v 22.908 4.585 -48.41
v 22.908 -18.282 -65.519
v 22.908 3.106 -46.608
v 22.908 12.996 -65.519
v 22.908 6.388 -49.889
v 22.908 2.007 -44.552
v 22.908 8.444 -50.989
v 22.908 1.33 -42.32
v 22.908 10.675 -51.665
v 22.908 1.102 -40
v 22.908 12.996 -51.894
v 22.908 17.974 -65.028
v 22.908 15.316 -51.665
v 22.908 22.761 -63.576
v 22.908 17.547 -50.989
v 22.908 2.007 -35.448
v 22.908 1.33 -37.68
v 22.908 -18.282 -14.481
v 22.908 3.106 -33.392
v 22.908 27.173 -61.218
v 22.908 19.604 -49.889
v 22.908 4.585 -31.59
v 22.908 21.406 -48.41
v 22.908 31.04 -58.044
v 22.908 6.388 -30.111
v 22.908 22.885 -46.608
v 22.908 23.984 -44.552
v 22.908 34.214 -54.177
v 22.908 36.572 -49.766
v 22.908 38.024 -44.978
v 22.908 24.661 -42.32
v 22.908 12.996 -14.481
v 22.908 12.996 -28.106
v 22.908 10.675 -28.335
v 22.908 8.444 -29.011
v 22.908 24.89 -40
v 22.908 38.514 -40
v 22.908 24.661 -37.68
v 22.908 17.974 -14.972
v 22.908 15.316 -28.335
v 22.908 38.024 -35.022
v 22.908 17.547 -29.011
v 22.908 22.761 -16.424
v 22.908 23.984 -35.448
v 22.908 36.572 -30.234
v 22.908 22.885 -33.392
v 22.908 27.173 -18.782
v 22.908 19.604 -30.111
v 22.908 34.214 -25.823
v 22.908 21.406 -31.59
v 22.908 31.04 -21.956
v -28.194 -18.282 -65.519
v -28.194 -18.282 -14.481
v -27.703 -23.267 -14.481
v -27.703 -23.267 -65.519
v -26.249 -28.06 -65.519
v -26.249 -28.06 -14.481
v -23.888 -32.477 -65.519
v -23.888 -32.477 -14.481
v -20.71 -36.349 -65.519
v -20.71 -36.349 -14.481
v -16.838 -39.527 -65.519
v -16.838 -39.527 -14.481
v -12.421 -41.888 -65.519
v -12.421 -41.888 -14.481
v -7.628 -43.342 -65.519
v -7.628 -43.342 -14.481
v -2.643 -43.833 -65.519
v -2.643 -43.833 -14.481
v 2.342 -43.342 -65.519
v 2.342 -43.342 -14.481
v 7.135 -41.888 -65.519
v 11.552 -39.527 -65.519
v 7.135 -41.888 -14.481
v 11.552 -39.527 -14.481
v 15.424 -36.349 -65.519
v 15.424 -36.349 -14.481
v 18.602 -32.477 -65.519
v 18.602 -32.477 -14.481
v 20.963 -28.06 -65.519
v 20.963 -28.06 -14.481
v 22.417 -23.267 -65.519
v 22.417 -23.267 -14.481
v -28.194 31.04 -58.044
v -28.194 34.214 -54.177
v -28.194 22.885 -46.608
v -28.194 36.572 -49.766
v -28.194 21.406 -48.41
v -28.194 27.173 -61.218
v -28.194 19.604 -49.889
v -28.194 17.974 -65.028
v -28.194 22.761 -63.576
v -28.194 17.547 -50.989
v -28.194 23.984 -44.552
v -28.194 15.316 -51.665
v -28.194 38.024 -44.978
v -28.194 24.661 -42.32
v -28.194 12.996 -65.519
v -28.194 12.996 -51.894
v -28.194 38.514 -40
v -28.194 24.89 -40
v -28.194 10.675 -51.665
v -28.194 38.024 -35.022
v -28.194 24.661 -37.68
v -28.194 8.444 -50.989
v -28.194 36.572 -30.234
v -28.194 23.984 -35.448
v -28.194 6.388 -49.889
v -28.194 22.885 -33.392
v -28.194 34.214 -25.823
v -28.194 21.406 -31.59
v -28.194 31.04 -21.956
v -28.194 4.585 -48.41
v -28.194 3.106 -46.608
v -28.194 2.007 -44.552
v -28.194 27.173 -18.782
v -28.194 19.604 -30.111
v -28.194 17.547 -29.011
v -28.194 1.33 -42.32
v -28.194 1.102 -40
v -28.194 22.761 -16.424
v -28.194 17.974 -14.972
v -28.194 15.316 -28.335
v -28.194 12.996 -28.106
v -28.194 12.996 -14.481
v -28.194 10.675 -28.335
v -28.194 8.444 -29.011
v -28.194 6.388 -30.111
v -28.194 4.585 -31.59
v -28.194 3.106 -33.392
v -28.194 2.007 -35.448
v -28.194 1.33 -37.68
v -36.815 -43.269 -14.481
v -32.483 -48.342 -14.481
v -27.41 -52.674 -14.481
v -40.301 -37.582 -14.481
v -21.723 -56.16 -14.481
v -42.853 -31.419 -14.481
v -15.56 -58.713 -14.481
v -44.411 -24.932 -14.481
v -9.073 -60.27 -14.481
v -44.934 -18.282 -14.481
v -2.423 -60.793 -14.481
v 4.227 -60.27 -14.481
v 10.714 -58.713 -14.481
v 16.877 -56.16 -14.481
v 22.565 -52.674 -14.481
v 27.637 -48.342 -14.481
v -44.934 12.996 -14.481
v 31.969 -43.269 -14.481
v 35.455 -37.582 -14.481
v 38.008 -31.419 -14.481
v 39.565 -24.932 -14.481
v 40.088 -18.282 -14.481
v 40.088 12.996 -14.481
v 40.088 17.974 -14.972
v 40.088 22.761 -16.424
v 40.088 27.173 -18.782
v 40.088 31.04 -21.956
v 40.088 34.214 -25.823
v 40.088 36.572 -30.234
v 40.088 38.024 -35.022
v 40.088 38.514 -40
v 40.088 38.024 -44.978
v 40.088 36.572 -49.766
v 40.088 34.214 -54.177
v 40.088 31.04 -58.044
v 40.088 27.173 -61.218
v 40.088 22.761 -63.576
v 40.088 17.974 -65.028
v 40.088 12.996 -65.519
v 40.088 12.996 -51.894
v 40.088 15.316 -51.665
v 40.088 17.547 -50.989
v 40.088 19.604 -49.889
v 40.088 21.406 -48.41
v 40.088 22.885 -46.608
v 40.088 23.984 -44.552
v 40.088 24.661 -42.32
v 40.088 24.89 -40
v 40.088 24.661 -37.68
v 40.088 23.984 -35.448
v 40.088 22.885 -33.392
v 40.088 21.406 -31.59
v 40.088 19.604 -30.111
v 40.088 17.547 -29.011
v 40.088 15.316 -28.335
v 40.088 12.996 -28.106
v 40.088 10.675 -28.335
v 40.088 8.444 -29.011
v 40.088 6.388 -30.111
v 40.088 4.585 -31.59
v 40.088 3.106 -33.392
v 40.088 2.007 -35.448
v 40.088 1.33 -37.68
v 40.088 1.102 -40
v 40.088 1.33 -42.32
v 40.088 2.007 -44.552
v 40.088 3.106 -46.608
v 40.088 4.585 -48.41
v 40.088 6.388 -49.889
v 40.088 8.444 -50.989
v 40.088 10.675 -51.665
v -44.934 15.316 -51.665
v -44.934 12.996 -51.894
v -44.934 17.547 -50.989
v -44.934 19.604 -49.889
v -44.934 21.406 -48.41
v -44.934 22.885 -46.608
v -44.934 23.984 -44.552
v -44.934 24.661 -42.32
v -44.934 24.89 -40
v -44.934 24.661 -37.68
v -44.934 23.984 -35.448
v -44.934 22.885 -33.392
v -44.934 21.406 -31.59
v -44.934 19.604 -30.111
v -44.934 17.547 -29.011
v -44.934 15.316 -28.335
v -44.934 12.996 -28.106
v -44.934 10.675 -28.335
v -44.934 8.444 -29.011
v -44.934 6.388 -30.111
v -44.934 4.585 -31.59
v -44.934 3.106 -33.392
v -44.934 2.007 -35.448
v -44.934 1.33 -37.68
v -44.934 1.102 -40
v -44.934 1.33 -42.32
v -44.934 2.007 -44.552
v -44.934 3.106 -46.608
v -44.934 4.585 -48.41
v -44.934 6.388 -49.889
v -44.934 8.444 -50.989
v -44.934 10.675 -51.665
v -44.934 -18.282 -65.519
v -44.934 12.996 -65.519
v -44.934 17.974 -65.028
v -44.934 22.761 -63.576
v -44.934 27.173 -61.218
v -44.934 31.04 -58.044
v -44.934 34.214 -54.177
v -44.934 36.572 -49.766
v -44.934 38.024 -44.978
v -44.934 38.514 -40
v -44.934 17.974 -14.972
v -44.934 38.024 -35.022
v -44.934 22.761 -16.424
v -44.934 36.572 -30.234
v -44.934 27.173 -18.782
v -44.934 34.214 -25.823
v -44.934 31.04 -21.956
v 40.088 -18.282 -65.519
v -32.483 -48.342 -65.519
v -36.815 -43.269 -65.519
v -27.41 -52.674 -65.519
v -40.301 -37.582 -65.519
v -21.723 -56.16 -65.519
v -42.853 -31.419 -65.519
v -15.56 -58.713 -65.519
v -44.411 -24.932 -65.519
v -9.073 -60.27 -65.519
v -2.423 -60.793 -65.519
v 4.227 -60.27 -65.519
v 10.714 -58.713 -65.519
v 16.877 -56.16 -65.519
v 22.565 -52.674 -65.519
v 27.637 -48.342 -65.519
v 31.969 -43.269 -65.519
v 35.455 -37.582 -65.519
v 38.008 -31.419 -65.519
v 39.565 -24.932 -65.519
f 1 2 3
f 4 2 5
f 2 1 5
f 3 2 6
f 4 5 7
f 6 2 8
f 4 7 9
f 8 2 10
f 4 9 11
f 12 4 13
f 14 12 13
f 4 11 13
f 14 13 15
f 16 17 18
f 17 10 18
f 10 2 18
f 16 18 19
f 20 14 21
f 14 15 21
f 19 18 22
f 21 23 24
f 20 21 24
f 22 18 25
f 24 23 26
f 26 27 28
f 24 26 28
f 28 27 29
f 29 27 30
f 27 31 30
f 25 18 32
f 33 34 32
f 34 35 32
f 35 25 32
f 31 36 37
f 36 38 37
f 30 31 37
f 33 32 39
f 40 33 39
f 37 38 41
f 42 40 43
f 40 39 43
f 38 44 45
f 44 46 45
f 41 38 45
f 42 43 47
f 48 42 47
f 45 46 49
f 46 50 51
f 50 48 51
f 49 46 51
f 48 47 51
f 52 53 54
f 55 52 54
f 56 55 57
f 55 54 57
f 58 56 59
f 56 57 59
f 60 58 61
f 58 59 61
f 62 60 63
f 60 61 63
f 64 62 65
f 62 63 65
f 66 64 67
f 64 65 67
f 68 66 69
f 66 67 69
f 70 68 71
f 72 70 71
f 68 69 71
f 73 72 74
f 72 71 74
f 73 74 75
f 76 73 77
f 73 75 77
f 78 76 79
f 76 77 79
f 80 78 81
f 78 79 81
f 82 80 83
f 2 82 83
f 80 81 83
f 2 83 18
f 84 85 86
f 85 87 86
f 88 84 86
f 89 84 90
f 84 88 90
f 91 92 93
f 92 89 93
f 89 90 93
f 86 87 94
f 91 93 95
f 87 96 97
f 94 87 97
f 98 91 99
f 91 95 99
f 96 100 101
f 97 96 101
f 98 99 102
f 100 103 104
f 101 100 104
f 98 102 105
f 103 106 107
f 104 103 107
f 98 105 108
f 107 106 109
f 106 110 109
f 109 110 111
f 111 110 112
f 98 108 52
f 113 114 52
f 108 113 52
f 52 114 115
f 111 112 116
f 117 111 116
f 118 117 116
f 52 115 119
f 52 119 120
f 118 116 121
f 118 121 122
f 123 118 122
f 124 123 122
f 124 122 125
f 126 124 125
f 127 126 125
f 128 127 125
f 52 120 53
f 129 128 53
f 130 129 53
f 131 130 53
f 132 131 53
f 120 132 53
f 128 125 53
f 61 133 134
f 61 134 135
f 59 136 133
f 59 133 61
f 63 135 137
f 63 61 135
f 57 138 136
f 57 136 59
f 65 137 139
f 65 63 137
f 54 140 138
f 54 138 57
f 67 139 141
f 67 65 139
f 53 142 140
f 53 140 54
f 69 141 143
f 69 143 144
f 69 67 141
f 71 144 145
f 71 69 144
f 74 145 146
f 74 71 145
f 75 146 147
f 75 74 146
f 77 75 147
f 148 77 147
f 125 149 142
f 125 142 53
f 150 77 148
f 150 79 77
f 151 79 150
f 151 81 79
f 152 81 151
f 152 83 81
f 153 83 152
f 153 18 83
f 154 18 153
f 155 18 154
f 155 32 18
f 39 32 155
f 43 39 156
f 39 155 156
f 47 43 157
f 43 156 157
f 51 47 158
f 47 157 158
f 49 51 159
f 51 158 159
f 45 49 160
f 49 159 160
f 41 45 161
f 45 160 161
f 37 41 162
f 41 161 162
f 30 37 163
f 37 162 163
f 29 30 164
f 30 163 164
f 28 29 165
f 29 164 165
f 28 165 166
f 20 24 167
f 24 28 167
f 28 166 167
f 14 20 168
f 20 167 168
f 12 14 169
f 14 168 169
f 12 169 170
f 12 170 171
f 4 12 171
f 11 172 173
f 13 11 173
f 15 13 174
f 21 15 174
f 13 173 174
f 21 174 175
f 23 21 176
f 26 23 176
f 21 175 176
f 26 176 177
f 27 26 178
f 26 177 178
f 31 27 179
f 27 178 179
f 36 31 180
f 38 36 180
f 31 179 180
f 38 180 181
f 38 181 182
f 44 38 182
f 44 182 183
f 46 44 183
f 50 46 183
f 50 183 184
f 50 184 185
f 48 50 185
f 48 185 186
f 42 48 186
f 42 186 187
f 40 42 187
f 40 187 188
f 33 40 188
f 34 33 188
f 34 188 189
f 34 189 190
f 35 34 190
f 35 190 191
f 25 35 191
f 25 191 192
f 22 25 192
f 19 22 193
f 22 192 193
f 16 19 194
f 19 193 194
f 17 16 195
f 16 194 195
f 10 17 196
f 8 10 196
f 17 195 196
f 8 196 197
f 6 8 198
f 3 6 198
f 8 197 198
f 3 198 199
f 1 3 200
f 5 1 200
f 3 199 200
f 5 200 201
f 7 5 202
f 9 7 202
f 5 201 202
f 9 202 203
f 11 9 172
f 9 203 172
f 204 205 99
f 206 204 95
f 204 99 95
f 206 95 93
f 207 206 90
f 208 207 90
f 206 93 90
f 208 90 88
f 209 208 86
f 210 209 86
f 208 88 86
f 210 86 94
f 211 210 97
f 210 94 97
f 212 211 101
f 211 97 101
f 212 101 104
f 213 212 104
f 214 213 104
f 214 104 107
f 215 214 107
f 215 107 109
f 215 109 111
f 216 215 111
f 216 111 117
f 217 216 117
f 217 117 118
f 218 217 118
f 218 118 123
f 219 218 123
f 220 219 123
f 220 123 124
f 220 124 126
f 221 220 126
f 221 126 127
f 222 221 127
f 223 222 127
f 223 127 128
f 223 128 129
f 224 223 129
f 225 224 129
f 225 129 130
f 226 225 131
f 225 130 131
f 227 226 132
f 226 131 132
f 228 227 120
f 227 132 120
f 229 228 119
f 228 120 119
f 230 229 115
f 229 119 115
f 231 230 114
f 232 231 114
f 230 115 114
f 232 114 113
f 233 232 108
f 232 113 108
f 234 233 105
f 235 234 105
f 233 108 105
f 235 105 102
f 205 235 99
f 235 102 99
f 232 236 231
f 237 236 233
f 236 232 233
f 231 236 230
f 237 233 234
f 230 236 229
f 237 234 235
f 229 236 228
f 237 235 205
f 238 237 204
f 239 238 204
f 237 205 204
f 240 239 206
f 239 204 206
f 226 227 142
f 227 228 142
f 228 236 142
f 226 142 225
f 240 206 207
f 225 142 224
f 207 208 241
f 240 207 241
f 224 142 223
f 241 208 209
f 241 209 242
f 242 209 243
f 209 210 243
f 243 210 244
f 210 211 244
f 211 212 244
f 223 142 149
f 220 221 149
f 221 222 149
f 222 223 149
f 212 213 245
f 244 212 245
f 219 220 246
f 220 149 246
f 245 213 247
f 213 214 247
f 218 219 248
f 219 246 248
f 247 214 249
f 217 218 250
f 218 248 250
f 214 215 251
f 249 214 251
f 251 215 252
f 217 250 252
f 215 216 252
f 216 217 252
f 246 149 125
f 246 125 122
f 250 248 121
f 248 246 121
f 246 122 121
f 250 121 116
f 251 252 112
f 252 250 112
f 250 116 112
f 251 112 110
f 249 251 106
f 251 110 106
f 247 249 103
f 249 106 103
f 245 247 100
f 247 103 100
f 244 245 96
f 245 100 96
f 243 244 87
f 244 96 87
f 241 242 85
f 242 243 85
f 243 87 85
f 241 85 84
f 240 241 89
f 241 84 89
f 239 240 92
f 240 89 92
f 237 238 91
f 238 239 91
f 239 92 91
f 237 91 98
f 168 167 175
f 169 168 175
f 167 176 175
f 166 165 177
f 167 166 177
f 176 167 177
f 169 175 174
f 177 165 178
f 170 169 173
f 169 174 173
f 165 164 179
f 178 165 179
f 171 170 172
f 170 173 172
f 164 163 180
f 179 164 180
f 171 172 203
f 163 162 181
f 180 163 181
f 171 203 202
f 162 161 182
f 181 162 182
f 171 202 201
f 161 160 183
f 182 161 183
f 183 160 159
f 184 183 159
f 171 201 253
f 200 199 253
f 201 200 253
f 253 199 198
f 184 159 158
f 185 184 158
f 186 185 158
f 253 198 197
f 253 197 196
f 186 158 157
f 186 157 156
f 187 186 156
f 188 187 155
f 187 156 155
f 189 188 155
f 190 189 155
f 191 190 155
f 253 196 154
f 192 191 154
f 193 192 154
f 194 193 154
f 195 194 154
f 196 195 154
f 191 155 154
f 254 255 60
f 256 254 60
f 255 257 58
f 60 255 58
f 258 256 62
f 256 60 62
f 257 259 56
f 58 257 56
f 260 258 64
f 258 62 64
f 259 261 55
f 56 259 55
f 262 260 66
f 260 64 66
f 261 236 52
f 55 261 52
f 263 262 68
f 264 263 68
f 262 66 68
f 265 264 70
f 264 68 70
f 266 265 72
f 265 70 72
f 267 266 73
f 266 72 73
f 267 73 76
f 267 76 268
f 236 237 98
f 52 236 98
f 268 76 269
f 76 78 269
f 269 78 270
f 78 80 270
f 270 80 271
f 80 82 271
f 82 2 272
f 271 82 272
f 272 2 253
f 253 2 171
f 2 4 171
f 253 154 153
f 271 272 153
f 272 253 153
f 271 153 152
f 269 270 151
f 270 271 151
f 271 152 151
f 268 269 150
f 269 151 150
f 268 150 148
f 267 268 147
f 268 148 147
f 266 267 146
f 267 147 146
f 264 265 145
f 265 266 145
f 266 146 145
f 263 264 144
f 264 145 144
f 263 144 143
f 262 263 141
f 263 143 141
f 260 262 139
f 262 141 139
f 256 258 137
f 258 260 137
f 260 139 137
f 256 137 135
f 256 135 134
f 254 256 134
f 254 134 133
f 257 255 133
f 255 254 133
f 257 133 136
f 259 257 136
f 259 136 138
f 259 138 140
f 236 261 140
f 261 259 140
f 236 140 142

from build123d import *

# Parameters (mm, degrees)
BOSS_EXTRUDE1_DEPTH = 80
CUT_EXTRUDE4_DEPTH  = 86.022442091
SKETCH3_W           = 85.02244209
SKETCH3_H           = 14.481412897
CUT_EXTRUDE5_DEPTH  = 61.793248749
SKETCH4_R           = 11.893880873
CUT_EXTRUDE6_DEPTH  = 86.022442091


with BuildPart() as part:
    # Sketch1 → Boss-Extrude1 (new body)
    with BuildSketch(Plane.XY):
        with BuildLine():
            Line((40.088301711, 44.273344197), (40.088301711, -18.282027703))
            ThreePointArc((40.088301711, -18.282027703), (-2.422919334, -60.793248749), (-44.934140379, -18.282027703))
            Line((-44.934140379, -18.282027703), (-44.934140379, 44.273344197))
            Line((-44.934140379, 44.273344197), (-28.193970434, 44.273344197))
            Line((-28.193970434, 44.273344197), (-28.193970434, -18.282027703))
            ThreePointArc((-28.193970434, -18.282027703), (-2.643184728, -43.832813409), (22.907600978, -18.282027703))
            Line((22.907600978, -18.282027703), (22.907600978, 44.273344197))
            Line((22.907600978, 44.273344197), (40.088301711, 44.273344197))
        make_face()
    extrude(amount=-BOSS_EXTRUDE1_DEPTH)

    # Sketch2 → Cut-Extrude4 (cut, through all)
    with BuildSketch(Plane(origin=(40.088301711, 0, 0), x_dir=(0, 0, -1), z_dir=(1, 0, 0))):
        with BuildLine():
            Line((14.481412897, -18.282027703), (14.481412897, 12.995658247))
            ThreePointArc((14.481412897, 12.995658247), (40, 38.51424535), (65.518587103, 12.995658247))
            Line((65.518587103, 12.995658247), (65.518587103, -18.282027703))
            Line((65.518587103, -18.282027703), (80, -18.282027703))
            Line((80, -18.282027703), (80, 44.273344197))
            Line((80, 44.273344197), (0, 44.273344197))
            Line((0, 44.273344197), (0, -18.282027703))
            Line((0, -18.282027703), (14.481412897, -18.282027703))
        make_face()
    extrude(amount=-CUT_EXTRUDE4_DEPTH, mode=Mode.SUBTRACT)

    # Sketch3 → Cut-Extrude5 (cut, through all)
    with BuildSketch(Plane(origin=(0, 0, 0), x_dir=(1, 0, 0), z_dir=(0, 1, 0))):
        with Locations((-2.422919334, 7.240706449)):
            Rectangle(SKETCH3_W, SKETCH3_H)
        with Locations((-2.422919334, 72.759293552)):
            Rectangle(SKETCH3_W, SKETCH3_H)
    extrude(amount=-CUT_EXTRUDE5_DEPTH, mode=Mode.SUBTRACT)

    # Sketch4 → Cut-Extrude6 (cut, through all)
    with BuildSketch(Plane(origin=(40.088301711, 0, 0), x_dir=(0, 0, -1), z_dir=(1, 0, 0))):
        with Locations((40, 12.995658247)):
            Circle(SKETCH4_R)
    extrude(amount=-CUT_EXTRUDE6_DEPTH, mode=Mode.SUBTRACT)


solid = part.part
